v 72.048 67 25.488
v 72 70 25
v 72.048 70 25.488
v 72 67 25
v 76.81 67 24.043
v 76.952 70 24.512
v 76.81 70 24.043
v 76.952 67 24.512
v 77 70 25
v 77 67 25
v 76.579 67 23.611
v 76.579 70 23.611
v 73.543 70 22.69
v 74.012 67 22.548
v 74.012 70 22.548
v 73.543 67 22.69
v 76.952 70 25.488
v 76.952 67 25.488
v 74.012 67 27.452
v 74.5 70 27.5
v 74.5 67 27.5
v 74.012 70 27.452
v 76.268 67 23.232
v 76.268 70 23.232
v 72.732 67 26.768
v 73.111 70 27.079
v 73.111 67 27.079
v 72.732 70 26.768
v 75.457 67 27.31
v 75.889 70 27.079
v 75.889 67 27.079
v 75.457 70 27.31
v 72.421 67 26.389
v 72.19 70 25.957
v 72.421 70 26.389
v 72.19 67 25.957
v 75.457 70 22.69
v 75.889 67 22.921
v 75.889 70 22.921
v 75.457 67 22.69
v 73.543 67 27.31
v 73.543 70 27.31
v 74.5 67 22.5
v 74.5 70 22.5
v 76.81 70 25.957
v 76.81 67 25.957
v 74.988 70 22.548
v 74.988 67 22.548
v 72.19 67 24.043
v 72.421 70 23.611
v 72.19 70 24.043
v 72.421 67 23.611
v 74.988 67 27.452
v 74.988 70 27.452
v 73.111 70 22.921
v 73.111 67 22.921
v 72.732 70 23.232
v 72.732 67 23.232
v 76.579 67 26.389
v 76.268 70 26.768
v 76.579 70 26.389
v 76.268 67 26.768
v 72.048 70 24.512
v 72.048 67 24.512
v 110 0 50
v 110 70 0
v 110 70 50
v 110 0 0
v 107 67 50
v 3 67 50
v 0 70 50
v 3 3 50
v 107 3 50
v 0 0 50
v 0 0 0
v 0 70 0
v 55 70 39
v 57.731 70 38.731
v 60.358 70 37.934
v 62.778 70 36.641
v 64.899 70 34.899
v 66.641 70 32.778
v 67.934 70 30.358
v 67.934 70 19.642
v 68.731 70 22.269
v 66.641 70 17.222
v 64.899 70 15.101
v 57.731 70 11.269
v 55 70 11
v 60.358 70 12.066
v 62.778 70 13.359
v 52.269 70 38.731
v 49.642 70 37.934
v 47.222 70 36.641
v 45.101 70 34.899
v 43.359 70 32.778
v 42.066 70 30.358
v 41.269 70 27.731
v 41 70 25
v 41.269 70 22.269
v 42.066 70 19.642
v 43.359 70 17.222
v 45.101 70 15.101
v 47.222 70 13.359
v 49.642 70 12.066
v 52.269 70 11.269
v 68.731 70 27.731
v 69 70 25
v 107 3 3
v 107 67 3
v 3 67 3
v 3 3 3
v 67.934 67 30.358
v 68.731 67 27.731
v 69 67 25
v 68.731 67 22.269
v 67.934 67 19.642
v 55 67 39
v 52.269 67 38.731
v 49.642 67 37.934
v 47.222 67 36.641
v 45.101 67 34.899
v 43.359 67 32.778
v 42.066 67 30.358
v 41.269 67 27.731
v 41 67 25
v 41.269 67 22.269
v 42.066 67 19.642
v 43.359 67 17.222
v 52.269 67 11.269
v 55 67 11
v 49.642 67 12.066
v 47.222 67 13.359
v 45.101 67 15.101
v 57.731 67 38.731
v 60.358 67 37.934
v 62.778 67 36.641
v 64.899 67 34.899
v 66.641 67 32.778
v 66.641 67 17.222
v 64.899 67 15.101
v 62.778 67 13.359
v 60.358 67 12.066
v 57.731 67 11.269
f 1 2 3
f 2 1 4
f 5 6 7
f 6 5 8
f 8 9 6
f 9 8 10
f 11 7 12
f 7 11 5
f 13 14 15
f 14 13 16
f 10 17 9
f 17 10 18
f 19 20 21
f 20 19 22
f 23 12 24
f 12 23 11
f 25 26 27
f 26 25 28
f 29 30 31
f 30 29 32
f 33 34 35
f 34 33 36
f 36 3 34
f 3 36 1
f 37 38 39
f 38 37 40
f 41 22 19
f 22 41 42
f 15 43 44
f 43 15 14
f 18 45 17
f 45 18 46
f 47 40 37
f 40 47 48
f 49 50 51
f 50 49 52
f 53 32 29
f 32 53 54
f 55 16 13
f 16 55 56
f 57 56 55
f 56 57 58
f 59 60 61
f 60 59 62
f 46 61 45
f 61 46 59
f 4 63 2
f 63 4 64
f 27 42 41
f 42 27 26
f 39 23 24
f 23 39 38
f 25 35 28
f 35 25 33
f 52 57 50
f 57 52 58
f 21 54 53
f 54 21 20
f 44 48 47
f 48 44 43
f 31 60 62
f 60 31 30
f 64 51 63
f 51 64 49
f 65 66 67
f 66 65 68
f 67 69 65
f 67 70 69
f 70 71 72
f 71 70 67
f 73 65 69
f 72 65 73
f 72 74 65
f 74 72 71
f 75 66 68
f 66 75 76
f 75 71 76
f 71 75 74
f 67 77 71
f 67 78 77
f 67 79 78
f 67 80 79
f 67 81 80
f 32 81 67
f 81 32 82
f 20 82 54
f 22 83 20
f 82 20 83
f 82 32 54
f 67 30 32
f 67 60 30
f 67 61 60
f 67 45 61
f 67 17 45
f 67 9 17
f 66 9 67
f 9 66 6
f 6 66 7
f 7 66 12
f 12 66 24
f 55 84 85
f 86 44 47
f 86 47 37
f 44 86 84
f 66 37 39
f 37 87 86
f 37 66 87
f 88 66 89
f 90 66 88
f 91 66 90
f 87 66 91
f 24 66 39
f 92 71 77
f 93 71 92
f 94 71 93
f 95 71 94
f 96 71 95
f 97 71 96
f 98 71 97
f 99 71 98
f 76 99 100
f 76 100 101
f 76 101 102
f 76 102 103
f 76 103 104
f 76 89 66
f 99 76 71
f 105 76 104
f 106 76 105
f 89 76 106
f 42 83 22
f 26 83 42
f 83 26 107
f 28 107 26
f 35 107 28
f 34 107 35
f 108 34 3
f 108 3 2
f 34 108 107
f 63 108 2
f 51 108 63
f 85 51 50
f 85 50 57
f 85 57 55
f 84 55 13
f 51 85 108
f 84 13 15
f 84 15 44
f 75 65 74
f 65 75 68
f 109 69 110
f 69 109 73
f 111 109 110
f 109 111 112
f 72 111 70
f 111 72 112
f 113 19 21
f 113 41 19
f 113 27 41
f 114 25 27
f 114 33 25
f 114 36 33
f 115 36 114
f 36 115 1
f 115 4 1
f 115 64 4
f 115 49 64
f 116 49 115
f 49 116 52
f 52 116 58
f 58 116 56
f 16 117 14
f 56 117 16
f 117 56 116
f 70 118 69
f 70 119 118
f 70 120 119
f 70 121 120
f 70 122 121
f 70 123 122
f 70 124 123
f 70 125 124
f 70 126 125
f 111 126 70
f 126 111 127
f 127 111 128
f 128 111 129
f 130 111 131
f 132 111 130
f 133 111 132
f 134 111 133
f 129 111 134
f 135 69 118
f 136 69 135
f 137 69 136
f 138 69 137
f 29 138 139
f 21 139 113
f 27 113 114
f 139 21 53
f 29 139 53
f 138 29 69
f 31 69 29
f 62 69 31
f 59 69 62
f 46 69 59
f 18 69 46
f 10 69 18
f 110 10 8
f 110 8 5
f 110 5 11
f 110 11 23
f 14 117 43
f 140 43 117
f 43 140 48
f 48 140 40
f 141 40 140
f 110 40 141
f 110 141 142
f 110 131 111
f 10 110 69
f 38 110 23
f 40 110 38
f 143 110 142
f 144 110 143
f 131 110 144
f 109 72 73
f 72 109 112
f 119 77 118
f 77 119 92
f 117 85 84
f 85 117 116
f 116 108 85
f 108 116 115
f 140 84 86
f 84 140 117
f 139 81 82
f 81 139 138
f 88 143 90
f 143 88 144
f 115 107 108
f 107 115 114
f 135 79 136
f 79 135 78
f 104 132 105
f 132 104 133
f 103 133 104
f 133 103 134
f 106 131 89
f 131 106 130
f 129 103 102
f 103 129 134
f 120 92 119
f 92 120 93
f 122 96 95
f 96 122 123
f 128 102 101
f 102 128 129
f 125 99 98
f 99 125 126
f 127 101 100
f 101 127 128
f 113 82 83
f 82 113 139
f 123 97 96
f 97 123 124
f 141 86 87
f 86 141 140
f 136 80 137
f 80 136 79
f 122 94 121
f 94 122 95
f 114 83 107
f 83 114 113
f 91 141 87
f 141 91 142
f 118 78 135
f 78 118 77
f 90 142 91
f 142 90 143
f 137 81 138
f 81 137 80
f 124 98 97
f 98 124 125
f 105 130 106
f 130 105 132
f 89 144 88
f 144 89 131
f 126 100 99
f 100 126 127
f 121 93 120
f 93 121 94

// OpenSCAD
$fn = 32;

// ----------------------------------------------------------------------
// Vent box: roundvent enclosure
// ----------------------------------------------------------------------

// --- parameters (mm) ---
box_l = 110;              // box length, X
box_w = 70;               // box width, Y
box_h = 50;               // box height, Z
wall_t = 3;               // shell wall thickness
vent_d = 28;              // central vent diameter
ring_d = 5;               // ring hole diameter
n_ring = 6;               // holes in the ring
ring_r = 19.5;            // ring radius

ring_step = 360 / n_ring;  // ring hole angular step

difference() {
  cube([box_l, box_w, box_h]);
  translate([wall_t, wall_t, wall_t])
    cube([box_l - 2 * wall_t, box_w - 2 * wall_t, box_h]);
  translate([box_l / 2, box_w - wall_t - 1, box_h / 2])
    rotate([-90, 0, 0]) cylinder(h = wall_t + 2, d = vent_d);
  for (i = [0 : n_ring - 1])
    translate([box_l / 2, box_w - wall_t - 1, box_h / 2])
      rotate([0, 0, i * ring_step])
        translate([ring_r, 0, 0]) rotate([-90, 0, 0])
          cylinder(h = wall_t + 2, d = ring_d);
}
